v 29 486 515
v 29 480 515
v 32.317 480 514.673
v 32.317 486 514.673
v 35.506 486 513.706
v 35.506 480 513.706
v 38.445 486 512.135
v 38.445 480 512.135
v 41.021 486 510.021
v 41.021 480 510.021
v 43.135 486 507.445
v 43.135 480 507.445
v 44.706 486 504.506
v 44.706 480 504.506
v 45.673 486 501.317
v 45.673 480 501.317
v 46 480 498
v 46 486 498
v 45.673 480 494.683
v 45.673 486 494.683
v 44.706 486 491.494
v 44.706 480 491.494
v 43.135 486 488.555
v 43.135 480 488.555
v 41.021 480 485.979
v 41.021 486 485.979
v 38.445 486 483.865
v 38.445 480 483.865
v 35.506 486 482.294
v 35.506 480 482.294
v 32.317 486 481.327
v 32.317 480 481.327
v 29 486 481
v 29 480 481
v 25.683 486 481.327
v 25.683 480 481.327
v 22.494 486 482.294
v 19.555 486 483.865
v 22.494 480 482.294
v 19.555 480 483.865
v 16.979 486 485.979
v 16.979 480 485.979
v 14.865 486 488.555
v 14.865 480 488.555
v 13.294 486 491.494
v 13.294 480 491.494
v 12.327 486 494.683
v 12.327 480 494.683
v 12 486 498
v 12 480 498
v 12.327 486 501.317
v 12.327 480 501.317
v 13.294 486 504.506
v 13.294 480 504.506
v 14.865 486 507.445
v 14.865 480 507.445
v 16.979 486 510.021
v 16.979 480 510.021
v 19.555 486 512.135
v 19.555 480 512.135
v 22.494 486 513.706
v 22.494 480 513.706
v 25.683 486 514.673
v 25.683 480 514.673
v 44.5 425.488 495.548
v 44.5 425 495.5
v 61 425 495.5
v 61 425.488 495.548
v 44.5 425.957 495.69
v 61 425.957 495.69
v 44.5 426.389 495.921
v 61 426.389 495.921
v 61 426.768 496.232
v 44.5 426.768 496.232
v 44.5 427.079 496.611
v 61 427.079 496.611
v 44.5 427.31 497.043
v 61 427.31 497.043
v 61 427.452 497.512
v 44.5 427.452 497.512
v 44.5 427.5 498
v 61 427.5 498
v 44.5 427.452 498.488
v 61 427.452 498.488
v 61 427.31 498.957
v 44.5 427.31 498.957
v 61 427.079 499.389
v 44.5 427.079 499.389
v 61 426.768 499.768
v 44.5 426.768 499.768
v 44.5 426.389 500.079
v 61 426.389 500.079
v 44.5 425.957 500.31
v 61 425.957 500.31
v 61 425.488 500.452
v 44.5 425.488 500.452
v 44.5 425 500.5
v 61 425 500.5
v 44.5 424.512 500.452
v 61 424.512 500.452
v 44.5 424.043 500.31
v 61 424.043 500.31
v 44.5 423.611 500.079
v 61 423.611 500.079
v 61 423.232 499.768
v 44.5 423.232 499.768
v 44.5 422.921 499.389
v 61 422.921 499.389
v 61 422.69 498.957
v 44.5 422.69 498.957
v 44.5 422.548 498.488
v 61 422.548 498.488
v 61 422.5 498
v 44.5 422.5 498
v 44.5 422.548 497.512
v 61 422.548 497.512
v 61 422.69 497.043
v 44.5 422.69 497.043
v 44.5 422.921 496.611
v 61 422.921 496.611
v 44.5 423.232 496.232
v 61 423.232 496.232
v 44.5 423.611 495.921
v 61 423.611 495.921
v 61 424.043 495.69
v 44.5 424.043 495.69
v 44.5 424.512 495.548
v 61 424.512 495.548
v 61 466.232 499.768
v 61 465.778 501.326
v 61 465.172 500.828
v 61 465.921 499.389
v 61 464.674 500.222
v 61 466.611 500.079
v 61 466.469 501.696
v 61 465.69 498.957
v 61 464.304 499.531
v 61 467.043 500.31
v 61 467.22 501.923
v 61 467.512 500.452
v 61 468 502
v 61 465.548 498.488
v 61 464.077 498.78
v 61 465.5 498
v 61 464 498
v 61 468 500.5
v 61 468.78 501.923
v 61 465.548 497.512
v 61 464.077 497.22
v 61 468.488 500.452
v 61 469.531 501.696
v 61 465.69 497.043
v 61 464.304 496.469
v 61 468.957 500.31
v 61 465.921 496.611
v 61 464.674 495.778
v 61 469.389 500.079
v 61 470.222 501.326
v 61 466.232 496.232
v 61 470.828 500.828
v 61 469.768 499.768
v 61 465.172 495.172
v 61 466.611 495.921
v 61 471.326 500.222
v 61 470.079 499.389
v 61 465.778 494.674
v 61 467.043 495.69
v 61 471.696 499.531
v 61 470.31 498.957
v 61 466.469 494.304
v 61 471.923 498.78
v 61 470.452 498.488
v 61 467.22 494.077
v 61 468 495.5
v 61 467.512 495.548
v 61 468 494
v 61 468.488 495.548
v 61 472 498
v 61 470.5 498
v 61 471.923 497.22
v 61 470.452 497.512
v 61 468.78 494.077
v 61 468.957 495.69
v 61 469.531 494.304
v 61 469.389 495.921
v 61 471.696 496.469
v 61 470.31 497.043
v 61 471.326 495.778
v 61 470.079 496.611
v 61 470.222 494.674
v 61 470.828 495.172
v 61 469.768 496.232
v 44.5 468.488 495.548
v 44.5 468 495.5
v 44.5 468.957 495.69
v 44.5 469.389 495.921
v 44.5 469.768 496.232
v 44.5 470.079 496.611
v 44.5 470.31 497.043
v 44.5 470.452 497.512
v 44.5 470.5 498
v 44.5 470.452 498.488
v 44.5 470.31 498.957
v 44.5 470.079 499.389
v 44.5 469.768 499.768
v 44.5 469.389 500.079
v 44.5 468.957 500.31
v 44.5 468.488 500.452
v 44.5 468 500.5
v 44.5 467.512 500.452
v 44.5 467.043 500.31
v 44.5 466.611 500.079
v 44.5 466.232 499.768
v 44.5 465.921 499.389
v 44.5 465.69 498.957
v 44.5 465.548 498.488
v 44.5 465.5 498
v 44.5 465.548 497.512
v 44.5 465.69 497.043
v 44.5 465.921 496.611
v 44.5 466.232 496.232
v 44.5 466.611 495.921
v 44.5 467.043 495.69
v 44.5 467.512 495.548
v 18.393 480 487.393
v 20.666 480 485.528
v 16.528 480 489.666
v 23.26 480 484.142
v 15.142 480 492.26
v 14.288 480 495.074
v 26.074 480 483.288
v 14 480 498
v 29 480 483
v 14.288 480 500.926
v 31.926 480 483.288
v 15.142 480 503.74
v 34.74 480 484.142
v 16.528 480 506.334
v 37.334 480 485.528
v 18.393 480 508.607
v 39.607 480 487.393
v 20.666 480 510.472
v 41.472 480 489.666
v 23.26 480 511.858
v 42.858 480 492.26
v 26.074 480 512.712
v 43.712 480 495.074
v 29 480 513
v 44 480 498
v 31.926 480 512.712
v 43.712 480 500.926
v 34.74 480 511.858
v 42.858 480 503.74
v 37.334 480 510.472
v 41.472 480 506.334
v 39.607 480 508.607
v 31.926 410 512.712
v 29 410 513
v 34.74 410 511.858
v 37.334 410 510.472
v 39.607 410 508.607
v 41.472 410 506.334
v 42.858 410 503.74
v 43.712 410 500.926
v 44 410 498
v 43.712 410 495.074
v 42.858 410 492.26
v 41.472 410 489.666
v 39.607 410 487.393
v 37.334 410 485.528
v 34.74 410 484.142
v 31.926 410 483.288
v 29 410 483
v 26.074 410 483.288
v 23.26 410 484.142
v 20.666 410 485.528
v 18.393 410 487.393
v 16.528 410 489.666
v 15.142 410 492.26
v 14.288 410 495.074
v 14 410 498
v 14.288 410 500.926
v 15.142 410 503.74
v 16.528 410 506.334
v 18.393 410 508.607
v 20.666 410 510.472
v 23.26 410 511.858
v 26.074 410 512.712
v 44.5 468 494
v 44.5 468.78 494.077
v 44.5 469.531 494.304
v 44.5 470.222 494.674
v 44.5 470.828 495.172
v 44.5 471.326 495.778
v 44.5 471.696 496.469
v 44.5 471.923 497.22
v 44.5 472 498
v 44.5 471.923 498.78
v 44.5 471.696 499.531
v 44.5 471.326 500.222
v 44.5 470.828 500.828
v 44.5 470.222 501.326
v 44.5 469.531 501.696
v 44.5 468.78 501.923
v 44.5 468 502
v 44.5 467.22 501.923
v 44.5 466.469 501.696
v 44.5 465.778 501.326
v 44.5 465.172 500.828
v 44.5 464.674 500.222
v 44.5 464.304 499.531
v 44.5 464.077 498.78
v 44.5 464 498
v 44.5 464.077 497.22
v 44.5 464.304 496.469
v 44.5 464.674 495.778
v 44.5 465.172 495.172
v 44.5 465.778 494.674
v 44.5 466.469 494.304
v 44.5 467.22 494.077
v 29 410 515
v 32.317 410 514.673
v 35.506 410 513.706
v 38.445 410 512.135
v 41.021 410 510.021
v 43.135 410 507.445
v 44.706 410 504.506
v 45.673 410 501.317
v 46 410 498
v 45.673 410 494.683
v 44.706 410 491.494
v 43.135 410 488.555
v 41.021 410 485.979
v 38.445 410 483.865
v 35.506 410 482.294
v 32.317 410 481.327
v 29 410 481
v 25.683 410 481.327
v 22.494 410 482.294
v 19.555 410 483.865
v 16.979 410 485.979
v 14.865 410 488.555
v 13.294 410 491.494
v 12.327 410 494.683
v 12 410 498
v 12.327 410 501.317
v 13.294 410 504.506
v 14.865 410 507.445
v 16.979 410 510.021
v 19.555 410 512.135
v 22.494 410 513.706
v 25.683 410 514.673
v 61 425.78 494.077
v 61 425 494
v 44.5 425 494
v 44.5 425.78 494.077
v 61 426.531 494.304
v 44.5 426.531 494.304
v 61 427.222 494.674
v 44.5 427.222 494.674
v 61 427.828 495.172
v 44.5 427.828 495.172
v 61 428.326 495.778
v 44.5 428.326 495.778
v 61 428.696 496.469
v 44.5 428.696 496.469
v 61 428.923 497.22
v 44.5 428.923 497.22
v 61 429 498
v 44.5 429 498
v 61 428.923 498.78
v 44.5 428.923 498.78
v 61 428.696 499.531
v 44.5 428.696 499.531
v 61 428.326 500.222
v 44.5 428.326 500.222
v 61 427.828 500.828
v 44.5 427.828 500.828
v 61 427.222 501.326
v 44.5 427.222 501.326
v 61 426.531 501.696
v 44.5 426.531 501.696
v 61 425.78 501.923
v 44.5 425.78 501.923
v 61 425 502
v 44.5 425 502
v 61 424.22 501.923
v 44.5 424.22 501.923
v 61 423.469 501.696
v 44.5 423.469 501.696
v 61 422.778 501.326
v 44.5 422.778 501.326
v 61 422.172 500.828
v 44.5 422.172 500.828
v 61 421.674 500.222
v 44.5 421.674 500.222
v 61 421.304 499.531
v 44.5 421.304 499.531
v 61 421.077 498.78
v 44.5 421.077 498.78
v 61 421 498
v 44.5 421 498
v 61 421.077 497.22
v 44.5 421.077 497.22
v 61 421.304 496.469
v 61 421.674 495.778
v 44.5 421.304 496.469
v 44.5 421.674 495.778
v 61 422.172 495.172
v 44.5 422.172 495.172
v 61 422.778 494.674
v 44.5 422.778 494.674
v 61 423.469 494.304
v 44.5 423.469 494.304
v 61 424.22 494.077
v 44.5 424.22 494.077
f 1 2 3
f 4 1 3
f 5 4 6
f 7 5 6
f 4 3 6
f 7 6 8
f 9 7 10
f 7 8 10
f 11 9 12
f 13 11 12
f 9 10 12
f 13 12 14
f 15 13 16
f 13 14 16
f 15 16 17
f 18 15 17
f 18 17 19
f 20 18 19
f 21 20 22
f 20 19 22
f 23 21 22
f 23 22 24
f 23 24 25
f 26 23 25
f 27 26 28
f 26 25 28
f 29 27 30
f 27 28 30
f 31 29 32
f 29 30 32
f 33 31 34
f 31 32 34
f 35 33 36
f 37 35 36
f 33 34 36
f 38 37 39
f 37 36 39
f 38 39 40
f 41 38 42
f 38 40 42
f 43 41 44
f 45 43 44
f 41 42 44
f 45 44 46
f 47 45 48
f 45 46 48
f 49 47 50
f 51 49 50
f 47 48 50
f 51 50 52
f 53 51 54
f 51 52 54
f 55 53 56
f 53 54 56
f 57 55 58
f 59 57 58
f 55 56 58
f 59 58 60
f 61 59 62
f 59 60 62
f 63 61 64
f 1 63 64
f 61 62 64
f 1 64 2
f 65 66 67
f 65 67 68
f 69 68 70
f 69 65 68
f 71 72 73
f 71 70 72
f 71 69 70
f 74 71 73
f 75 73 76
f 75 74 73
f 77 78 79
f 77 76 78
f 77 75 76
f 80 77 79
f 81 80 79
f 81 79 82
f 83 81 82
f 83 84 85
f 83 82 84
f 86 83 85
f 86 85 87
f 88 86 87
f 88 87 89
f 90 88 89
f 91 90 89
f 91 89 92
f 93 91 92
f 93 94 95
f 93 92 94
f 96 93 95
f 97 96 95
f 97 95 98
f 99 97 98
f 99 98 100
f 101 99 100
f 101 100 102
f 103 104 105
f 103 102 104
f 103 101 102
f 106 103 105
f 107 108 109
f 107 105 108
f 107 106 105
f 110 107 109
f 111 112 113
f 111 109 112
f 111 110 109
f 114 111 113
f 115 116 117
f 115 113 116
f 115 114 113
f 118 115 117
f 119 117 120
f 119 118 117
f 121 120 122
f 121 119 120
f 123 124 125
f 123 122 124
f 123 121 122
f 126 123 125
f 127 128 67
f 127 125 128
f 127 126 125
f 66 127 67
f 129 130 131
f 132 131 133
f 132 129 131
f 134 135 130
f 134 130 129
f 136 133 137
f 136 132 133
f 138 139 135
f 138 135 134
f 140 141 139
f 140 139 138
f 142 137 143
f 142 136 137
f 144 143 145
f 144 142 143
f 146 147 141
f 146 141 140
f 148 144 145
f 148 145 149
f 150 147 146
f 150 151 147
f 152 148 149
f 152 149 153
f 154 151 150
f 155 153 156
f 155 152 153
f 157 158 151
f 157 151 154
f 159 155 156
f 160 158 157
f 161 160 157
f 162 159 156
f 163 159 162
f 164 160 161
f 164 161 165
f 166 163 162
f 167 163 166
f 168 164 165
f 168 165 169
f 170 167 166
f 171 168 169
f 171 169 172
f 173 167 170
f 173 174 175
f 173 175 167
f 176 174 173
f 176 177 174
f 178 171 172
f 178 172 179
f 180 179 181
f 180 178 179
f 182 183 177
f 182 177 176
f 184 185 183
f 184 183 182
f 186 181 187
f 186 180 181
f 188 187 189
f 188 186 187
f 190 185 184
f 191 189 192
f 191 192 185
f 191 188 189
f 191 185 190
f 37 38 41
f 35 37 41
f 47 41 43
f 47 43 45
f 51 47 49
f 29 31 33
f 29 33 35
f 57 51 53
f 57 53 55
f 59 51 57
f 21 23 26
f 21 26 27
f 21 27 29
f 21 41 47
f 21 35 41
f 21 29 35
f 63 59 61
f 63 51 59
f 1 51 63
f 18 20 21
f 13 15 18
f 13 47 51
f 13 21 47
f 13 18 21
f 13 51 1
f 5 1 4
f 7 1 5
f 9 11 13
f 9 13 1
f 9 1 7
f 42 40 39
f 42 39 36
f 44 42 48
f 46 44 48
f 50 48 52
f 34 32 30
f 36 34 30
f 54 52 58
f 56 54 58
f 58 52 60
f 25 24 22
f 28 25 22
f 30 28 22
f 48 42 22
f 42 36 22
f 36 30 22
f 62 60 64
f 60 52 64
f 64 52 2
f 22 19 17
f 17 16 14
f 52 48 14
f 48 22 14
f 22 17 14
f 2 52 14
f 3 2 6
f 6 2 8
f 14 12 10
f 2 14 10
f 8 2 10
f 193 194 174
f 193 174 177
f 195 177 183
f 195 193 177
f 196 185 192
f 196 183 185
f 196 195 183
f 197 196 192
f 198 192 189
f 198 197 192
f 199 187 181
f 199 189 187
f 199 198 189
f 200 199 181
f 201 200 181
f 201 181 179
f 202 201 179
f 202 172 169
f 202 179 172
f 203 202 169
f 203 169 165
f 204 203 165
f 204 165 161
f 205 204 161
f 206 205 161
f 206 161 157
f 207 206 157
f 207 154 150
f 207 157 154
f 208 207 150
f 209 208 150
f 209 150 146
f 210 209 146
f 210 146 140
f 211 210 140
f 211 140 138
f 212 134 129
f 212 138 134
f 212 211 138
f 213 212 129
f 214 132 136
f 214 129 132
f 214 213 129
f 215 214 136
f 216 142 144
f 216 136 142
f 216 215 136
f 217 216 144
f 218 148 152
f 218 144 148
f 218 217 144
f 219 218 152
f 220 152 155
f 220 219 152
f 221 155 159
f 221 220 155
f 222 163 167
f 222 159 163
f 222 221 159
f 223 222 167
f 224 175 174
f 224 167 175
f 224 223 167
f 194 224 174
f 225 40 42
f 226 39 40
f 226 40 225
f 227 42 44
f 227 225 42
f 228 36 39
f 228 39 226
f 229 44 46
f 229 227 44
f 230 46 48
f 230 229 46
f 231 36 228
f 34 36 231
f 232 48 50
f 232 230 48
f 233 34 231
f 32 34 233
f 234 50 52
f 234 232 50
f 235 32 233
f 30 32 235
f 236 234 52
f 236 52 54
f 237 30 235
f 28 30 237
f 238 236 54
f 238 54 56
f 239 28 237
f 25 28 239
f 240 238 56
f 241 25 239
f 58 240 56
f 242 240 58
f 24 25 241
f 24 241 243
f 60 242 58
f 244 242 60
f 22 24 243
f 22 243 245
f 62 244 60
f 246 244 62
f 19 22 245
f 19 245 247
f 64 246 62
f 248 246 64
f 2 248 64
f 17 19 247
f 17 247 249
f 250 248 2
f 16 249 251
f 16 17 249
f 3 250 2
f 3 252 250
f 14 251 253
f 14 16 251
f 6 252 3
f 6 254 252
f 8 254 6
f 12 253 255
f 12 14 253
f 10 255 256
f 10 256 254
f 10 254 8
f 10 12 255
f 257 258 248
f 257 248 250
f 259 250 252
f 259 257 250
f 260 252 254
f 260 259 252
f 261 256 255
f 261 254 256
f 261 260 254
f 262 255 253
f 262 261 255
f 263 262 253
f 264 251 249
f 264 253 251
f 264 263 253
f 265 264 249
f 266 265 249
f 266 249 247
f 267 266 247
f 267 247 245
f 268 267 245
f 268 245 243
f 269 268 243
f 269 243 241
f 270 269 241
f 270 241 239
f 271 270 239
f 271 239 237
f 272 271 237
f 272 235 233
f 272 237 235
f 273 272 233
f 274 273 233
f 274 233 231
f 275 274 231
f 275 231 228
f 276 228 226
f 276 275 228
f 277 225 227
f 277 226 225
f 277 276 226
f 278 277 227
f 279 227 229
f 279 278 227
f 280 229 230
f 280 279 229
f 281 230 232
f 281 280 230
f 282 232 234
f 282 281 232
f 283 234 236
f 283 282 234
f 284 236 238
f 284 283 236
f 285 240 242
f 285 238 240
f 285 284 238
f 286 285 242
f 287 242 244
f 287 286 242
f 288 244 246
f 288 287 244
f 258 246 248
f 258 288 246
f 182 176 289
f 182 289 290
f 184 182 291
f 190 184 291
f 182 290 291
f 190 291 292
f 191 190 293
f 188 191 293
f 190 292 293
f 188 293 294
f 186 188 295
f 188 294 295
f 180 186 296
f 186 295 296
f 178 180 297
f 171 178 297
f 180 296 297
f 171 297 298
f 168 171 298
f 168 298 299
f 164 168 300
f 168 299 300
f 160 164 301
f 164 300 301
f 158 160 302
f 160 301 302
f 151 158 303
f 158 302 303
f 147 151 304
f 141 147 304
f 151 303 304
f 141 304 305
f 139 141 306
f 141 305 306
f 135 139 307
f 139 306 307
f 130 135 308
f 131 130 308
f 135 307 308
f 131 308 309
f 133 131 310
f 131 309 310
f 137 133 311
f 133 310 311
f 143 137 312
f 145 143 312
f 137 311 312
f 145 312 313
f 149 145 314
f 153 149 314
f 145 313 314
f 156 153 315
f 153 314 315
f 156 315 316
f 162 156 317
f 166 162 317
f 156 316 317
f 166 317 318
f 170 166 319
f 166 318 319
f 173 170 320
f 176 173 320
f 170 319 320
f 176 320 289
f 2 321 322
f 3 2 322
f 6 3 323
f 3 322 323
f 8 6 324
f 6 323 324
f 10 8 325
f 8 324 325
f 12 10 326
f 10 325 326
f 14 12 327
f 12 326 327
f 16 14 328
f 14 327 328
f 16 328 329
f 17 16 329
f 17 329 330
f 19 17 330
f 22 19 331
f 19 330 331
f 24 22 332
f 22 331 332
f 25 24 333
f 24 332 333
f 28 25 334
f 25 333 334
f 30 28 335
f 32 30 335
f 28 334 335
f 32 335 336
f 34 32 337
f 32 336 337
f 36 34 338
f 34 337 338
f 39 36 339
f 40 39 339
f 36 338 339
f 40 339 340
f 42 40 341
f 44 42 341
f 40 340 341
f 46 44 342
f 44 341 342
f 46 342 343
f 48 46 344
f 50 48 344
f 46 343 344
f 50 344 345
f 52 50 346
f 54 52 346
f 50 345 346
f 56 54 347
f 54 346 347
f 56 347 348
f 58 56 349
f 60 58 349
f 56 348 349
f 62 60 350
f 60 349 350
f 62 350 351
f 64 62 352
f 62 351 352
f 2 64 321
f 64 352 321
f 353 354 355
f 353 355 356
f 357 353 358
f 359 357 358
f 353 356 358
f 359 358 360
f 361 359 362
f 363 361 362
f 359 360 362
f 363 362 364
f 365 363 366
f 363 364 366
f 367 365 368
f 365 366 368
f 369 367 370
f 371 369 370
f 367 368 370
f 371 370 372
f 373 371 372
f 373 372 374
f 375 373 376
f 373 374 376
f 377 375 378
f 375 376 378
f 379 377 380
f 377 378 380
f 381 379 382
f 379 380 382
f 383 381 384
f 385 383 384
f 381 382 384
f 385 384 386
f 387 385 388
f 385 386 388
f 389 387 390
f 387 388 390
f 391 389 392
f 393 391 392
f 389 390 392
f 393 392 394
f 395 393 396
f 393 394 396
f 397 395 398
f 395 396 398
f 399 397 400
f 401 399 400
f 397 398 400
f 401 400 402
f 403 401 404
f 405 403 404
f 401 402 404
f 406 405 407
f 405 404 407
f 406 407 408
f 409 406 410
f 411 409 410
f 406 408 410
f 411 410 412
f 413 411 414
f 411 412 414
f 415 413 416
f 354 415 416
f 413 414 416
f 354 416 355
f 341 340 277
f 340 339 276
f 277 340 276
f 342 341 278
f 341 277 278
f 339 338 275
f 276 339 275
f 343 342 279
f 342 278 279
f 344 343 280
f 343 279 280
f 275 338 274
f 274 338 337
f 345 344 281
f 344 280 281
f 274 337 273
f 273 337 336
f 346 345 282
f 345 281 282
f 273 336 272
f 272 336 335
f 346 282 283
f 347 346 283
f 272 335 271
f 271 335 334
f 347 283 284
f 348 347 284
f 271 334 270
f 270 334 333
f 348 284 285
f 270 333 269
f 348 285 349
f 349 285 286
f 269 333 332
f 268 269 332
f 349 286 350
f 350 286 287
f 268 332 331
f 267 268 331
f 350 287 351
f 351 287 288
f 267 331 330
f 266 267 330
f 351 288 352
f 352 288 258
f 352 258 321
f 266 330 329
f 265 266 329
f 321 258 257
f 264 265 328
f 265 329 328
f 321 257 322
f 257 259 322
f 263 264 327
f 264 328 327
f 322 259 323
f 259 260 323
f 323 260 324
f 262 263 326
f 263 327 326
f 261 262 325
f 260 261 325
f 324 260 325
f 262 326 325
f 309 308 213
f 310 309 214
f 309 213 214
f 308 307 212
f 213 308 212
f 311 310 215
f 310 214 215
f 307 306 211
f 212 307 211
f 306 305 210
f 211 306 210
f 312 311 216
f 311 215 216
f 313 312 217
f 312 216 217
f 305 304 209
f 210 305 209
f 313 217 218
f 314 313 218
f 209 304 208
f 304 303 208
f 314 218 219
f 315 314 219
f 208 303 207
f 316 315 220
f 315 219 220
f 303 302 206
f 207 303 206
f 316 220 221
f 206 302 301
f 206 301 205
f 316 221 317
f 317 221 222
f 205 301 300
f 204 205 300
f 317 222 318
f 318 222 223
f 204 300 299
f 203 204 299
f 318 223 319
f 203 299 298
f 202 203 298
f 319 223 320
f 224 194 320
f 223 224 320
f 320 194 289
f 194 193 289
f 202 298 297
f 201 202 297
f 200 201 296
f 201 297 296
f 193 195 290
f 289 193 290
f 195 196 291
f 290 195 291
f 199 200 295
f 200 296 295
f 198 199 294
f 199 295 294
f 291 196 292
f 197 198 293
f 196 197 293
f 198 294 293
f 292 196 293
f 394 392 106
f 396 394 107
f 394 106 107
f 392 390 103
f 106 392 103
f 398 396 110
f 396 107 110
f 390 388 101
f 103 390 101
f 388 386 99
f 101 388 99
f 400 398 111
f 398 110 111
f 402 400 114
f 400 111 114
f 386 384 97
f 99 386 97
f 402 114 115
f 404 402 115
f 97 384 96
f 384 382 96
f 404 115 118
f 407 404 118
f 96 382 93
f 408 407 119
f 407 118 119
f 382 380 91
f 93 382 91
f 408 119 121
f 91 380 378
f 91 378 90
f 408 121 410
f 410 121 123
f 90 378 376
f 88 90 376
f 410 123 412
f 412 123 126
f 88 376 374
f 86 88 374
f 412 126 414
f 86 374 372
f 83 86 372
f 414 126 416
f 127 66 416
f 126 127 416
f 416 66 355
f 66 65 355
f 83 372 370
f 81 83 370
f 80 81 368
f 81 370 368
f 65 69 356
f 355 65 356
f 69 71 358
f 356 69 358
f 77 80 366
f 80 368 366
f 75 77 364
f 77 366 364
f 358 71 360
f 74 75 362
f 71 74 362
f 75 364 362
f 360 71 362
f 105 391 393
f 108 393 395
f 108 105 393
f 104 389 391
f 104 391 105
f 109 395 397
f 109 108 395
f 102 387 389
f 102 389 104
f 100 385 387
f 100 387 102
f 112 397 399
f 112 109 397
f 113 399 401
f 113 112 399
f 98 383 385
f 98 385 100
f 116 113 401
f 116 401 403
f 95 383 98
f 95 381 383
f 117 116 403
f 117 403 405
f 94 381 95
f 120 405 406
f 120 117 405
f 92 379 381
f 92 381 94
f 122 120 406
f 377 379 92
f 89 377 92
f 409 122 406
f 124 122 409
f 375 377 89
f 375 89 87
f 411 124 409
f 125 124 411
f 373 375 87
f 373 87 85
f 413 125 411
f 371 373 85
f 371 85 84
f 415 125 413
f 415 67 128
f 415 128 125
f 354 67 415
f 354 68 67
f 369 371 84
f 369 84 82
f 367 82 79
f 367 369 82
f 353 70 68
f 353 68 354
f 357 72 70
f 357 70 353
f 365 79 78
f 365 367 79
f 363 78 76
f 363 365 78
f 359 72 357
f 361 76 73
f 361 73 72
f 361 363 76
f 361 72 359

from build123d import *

# Parameters (mm, degrees)
SLEEVE_START        = 410
SKETCH1_R           = 17
SLEEVE_DEPTH        = 70
BORE_START          = 409
SKETCH2_R           = 15
BORE_DEPTH          = 72
CAP_START           = 480
SKETCH3_R           = 17
CAP_DEPTH           = 6
SPIGOT_425_START    = 44.5
SKETCH4_R           = 4
SPIGOT_425_DEPTH    = 16.5
SPIGOT_BORE_START   = 44
SKETCH5_R           = 2.5
SPIGOT_BORE_DEPTH   = 18
SPIGOT_468_START    = 44.5
SKETCH6_R           = 4
SPIGOT_468_DEPTH    = 16.5
BOSS_EXTRUDE7_START = 44
SKETCH7_R           = 2.5
BOSS_EXTRUDE7_DEPTH = 18


with BuildPart() as part:
    # Sketch1 → sleeve (new body)
    with BuildSketch(Plane(origin=(0, 0, 0), x_dir=(1, 0, 0), z_dir=(0, 1, 0)).offset(SLEEVE_START)):
        with Locations((29, -498)):
            Circle(SKETCH1_R)
    extrude(amount=SLEEVE_DEPTH)


with BuildPart() as body_2:
    # Sketch2 → bore (new body)
    with BuildSketch(Plane(origin=(0, 0, 0), x_dir=(1, 0, 0), z_dir=(0, 1, 0)).offset(BORE_START)):
        with Locations((29, -498)):
            Circle(SKETCH2_R)
    extrude(amount=BORE_DEPTH)


with BuildPart() as part_1:
    add(part.part)

    # Combine1: cut body 2
    add(body_2.part, mode=Mode.SUBTRACT)


with BuildPart() as body_2_2:
    # Sketch3 → cap (new body)
    with BuildSketch(Plane(origin=(0, 0, 0), x_dir=(1, 0, 0), z_dir=(0, 1, 0)).offset(CAP_START)):
        with Locations((29, -498)):
            Circle(SKETCH3_R)
    extrude(amount=CAP_DEPTH)


with BuildPart() as body_3:
    # Sketch4 → spigot_425 (new body)
    with BuildSketch(Plane(origin=(0, 0, 0), x_dir=(0, 0, -1), z_dir=(1, 0, 0)).offset(SPIGOT_425_START)):
        with Locations((-498, 425)):
            Circle(SKETCH4_R)
    extrude(amount=SPIGOT_425_DEPTH)


with BuildPart() as body_4:
    # Sketch5 → spigot_bore (new body)
    with BuildSketch(Plane(origin=(0, 0, 0), x_dir=(0, 0, -1), z_dir=(1, 0, 0)).offset(SPIGOT_BORE_START)):
        with Locations((-498, 425)):
            Circle(SKETCH5_R)
    extrude(amount=SPIGOT_BORE_DEPTH)


with BuildPart() as body_3_1:
    add(body_3.part)

    # Combine2: cut body 4
    add(body_4.part, mode=Mode.SUBTRACT)


with BuildPart() as body_4_2:
    # Sketch6 → spigot_468 (new body)
    with BuildSketch(Plane(origin=(0, 0, 0), x_dir=(0, 0, -1), z_dir=(1, 0, 0)).offset(SPIGOT_468_START)):
        with Locations((-498, 468)):
            Circle(SKETCH6_R)
    extrude(amount=SPIGOT_468_DEPTH)


with BuildPart() as body_5:
    # Sketch7 → Boss-Extrude7 (new body)
    with BuildSketch(Plane(origin=(0, 0, 0), x_dir=(0, 0, -1), z_dir=(1, 0, 0)).offset(BOSS_EXTRUDE7_START)):
        with Locations((-498, 468)):
            Circle(SKETCH7_R)
    extrude(amount=BOSS_EXTRUDE7_DEPTH)


with BuildPart() as body_4_2_1:
    add(body_4_2.part)

    # Combine3: cut body 5
    add(body_5.part, mode=Mode.SUBTRACT)


solid = Compound([part_1.part, body_2_2.part, body_3_1.part, body_4_2_1.part])
